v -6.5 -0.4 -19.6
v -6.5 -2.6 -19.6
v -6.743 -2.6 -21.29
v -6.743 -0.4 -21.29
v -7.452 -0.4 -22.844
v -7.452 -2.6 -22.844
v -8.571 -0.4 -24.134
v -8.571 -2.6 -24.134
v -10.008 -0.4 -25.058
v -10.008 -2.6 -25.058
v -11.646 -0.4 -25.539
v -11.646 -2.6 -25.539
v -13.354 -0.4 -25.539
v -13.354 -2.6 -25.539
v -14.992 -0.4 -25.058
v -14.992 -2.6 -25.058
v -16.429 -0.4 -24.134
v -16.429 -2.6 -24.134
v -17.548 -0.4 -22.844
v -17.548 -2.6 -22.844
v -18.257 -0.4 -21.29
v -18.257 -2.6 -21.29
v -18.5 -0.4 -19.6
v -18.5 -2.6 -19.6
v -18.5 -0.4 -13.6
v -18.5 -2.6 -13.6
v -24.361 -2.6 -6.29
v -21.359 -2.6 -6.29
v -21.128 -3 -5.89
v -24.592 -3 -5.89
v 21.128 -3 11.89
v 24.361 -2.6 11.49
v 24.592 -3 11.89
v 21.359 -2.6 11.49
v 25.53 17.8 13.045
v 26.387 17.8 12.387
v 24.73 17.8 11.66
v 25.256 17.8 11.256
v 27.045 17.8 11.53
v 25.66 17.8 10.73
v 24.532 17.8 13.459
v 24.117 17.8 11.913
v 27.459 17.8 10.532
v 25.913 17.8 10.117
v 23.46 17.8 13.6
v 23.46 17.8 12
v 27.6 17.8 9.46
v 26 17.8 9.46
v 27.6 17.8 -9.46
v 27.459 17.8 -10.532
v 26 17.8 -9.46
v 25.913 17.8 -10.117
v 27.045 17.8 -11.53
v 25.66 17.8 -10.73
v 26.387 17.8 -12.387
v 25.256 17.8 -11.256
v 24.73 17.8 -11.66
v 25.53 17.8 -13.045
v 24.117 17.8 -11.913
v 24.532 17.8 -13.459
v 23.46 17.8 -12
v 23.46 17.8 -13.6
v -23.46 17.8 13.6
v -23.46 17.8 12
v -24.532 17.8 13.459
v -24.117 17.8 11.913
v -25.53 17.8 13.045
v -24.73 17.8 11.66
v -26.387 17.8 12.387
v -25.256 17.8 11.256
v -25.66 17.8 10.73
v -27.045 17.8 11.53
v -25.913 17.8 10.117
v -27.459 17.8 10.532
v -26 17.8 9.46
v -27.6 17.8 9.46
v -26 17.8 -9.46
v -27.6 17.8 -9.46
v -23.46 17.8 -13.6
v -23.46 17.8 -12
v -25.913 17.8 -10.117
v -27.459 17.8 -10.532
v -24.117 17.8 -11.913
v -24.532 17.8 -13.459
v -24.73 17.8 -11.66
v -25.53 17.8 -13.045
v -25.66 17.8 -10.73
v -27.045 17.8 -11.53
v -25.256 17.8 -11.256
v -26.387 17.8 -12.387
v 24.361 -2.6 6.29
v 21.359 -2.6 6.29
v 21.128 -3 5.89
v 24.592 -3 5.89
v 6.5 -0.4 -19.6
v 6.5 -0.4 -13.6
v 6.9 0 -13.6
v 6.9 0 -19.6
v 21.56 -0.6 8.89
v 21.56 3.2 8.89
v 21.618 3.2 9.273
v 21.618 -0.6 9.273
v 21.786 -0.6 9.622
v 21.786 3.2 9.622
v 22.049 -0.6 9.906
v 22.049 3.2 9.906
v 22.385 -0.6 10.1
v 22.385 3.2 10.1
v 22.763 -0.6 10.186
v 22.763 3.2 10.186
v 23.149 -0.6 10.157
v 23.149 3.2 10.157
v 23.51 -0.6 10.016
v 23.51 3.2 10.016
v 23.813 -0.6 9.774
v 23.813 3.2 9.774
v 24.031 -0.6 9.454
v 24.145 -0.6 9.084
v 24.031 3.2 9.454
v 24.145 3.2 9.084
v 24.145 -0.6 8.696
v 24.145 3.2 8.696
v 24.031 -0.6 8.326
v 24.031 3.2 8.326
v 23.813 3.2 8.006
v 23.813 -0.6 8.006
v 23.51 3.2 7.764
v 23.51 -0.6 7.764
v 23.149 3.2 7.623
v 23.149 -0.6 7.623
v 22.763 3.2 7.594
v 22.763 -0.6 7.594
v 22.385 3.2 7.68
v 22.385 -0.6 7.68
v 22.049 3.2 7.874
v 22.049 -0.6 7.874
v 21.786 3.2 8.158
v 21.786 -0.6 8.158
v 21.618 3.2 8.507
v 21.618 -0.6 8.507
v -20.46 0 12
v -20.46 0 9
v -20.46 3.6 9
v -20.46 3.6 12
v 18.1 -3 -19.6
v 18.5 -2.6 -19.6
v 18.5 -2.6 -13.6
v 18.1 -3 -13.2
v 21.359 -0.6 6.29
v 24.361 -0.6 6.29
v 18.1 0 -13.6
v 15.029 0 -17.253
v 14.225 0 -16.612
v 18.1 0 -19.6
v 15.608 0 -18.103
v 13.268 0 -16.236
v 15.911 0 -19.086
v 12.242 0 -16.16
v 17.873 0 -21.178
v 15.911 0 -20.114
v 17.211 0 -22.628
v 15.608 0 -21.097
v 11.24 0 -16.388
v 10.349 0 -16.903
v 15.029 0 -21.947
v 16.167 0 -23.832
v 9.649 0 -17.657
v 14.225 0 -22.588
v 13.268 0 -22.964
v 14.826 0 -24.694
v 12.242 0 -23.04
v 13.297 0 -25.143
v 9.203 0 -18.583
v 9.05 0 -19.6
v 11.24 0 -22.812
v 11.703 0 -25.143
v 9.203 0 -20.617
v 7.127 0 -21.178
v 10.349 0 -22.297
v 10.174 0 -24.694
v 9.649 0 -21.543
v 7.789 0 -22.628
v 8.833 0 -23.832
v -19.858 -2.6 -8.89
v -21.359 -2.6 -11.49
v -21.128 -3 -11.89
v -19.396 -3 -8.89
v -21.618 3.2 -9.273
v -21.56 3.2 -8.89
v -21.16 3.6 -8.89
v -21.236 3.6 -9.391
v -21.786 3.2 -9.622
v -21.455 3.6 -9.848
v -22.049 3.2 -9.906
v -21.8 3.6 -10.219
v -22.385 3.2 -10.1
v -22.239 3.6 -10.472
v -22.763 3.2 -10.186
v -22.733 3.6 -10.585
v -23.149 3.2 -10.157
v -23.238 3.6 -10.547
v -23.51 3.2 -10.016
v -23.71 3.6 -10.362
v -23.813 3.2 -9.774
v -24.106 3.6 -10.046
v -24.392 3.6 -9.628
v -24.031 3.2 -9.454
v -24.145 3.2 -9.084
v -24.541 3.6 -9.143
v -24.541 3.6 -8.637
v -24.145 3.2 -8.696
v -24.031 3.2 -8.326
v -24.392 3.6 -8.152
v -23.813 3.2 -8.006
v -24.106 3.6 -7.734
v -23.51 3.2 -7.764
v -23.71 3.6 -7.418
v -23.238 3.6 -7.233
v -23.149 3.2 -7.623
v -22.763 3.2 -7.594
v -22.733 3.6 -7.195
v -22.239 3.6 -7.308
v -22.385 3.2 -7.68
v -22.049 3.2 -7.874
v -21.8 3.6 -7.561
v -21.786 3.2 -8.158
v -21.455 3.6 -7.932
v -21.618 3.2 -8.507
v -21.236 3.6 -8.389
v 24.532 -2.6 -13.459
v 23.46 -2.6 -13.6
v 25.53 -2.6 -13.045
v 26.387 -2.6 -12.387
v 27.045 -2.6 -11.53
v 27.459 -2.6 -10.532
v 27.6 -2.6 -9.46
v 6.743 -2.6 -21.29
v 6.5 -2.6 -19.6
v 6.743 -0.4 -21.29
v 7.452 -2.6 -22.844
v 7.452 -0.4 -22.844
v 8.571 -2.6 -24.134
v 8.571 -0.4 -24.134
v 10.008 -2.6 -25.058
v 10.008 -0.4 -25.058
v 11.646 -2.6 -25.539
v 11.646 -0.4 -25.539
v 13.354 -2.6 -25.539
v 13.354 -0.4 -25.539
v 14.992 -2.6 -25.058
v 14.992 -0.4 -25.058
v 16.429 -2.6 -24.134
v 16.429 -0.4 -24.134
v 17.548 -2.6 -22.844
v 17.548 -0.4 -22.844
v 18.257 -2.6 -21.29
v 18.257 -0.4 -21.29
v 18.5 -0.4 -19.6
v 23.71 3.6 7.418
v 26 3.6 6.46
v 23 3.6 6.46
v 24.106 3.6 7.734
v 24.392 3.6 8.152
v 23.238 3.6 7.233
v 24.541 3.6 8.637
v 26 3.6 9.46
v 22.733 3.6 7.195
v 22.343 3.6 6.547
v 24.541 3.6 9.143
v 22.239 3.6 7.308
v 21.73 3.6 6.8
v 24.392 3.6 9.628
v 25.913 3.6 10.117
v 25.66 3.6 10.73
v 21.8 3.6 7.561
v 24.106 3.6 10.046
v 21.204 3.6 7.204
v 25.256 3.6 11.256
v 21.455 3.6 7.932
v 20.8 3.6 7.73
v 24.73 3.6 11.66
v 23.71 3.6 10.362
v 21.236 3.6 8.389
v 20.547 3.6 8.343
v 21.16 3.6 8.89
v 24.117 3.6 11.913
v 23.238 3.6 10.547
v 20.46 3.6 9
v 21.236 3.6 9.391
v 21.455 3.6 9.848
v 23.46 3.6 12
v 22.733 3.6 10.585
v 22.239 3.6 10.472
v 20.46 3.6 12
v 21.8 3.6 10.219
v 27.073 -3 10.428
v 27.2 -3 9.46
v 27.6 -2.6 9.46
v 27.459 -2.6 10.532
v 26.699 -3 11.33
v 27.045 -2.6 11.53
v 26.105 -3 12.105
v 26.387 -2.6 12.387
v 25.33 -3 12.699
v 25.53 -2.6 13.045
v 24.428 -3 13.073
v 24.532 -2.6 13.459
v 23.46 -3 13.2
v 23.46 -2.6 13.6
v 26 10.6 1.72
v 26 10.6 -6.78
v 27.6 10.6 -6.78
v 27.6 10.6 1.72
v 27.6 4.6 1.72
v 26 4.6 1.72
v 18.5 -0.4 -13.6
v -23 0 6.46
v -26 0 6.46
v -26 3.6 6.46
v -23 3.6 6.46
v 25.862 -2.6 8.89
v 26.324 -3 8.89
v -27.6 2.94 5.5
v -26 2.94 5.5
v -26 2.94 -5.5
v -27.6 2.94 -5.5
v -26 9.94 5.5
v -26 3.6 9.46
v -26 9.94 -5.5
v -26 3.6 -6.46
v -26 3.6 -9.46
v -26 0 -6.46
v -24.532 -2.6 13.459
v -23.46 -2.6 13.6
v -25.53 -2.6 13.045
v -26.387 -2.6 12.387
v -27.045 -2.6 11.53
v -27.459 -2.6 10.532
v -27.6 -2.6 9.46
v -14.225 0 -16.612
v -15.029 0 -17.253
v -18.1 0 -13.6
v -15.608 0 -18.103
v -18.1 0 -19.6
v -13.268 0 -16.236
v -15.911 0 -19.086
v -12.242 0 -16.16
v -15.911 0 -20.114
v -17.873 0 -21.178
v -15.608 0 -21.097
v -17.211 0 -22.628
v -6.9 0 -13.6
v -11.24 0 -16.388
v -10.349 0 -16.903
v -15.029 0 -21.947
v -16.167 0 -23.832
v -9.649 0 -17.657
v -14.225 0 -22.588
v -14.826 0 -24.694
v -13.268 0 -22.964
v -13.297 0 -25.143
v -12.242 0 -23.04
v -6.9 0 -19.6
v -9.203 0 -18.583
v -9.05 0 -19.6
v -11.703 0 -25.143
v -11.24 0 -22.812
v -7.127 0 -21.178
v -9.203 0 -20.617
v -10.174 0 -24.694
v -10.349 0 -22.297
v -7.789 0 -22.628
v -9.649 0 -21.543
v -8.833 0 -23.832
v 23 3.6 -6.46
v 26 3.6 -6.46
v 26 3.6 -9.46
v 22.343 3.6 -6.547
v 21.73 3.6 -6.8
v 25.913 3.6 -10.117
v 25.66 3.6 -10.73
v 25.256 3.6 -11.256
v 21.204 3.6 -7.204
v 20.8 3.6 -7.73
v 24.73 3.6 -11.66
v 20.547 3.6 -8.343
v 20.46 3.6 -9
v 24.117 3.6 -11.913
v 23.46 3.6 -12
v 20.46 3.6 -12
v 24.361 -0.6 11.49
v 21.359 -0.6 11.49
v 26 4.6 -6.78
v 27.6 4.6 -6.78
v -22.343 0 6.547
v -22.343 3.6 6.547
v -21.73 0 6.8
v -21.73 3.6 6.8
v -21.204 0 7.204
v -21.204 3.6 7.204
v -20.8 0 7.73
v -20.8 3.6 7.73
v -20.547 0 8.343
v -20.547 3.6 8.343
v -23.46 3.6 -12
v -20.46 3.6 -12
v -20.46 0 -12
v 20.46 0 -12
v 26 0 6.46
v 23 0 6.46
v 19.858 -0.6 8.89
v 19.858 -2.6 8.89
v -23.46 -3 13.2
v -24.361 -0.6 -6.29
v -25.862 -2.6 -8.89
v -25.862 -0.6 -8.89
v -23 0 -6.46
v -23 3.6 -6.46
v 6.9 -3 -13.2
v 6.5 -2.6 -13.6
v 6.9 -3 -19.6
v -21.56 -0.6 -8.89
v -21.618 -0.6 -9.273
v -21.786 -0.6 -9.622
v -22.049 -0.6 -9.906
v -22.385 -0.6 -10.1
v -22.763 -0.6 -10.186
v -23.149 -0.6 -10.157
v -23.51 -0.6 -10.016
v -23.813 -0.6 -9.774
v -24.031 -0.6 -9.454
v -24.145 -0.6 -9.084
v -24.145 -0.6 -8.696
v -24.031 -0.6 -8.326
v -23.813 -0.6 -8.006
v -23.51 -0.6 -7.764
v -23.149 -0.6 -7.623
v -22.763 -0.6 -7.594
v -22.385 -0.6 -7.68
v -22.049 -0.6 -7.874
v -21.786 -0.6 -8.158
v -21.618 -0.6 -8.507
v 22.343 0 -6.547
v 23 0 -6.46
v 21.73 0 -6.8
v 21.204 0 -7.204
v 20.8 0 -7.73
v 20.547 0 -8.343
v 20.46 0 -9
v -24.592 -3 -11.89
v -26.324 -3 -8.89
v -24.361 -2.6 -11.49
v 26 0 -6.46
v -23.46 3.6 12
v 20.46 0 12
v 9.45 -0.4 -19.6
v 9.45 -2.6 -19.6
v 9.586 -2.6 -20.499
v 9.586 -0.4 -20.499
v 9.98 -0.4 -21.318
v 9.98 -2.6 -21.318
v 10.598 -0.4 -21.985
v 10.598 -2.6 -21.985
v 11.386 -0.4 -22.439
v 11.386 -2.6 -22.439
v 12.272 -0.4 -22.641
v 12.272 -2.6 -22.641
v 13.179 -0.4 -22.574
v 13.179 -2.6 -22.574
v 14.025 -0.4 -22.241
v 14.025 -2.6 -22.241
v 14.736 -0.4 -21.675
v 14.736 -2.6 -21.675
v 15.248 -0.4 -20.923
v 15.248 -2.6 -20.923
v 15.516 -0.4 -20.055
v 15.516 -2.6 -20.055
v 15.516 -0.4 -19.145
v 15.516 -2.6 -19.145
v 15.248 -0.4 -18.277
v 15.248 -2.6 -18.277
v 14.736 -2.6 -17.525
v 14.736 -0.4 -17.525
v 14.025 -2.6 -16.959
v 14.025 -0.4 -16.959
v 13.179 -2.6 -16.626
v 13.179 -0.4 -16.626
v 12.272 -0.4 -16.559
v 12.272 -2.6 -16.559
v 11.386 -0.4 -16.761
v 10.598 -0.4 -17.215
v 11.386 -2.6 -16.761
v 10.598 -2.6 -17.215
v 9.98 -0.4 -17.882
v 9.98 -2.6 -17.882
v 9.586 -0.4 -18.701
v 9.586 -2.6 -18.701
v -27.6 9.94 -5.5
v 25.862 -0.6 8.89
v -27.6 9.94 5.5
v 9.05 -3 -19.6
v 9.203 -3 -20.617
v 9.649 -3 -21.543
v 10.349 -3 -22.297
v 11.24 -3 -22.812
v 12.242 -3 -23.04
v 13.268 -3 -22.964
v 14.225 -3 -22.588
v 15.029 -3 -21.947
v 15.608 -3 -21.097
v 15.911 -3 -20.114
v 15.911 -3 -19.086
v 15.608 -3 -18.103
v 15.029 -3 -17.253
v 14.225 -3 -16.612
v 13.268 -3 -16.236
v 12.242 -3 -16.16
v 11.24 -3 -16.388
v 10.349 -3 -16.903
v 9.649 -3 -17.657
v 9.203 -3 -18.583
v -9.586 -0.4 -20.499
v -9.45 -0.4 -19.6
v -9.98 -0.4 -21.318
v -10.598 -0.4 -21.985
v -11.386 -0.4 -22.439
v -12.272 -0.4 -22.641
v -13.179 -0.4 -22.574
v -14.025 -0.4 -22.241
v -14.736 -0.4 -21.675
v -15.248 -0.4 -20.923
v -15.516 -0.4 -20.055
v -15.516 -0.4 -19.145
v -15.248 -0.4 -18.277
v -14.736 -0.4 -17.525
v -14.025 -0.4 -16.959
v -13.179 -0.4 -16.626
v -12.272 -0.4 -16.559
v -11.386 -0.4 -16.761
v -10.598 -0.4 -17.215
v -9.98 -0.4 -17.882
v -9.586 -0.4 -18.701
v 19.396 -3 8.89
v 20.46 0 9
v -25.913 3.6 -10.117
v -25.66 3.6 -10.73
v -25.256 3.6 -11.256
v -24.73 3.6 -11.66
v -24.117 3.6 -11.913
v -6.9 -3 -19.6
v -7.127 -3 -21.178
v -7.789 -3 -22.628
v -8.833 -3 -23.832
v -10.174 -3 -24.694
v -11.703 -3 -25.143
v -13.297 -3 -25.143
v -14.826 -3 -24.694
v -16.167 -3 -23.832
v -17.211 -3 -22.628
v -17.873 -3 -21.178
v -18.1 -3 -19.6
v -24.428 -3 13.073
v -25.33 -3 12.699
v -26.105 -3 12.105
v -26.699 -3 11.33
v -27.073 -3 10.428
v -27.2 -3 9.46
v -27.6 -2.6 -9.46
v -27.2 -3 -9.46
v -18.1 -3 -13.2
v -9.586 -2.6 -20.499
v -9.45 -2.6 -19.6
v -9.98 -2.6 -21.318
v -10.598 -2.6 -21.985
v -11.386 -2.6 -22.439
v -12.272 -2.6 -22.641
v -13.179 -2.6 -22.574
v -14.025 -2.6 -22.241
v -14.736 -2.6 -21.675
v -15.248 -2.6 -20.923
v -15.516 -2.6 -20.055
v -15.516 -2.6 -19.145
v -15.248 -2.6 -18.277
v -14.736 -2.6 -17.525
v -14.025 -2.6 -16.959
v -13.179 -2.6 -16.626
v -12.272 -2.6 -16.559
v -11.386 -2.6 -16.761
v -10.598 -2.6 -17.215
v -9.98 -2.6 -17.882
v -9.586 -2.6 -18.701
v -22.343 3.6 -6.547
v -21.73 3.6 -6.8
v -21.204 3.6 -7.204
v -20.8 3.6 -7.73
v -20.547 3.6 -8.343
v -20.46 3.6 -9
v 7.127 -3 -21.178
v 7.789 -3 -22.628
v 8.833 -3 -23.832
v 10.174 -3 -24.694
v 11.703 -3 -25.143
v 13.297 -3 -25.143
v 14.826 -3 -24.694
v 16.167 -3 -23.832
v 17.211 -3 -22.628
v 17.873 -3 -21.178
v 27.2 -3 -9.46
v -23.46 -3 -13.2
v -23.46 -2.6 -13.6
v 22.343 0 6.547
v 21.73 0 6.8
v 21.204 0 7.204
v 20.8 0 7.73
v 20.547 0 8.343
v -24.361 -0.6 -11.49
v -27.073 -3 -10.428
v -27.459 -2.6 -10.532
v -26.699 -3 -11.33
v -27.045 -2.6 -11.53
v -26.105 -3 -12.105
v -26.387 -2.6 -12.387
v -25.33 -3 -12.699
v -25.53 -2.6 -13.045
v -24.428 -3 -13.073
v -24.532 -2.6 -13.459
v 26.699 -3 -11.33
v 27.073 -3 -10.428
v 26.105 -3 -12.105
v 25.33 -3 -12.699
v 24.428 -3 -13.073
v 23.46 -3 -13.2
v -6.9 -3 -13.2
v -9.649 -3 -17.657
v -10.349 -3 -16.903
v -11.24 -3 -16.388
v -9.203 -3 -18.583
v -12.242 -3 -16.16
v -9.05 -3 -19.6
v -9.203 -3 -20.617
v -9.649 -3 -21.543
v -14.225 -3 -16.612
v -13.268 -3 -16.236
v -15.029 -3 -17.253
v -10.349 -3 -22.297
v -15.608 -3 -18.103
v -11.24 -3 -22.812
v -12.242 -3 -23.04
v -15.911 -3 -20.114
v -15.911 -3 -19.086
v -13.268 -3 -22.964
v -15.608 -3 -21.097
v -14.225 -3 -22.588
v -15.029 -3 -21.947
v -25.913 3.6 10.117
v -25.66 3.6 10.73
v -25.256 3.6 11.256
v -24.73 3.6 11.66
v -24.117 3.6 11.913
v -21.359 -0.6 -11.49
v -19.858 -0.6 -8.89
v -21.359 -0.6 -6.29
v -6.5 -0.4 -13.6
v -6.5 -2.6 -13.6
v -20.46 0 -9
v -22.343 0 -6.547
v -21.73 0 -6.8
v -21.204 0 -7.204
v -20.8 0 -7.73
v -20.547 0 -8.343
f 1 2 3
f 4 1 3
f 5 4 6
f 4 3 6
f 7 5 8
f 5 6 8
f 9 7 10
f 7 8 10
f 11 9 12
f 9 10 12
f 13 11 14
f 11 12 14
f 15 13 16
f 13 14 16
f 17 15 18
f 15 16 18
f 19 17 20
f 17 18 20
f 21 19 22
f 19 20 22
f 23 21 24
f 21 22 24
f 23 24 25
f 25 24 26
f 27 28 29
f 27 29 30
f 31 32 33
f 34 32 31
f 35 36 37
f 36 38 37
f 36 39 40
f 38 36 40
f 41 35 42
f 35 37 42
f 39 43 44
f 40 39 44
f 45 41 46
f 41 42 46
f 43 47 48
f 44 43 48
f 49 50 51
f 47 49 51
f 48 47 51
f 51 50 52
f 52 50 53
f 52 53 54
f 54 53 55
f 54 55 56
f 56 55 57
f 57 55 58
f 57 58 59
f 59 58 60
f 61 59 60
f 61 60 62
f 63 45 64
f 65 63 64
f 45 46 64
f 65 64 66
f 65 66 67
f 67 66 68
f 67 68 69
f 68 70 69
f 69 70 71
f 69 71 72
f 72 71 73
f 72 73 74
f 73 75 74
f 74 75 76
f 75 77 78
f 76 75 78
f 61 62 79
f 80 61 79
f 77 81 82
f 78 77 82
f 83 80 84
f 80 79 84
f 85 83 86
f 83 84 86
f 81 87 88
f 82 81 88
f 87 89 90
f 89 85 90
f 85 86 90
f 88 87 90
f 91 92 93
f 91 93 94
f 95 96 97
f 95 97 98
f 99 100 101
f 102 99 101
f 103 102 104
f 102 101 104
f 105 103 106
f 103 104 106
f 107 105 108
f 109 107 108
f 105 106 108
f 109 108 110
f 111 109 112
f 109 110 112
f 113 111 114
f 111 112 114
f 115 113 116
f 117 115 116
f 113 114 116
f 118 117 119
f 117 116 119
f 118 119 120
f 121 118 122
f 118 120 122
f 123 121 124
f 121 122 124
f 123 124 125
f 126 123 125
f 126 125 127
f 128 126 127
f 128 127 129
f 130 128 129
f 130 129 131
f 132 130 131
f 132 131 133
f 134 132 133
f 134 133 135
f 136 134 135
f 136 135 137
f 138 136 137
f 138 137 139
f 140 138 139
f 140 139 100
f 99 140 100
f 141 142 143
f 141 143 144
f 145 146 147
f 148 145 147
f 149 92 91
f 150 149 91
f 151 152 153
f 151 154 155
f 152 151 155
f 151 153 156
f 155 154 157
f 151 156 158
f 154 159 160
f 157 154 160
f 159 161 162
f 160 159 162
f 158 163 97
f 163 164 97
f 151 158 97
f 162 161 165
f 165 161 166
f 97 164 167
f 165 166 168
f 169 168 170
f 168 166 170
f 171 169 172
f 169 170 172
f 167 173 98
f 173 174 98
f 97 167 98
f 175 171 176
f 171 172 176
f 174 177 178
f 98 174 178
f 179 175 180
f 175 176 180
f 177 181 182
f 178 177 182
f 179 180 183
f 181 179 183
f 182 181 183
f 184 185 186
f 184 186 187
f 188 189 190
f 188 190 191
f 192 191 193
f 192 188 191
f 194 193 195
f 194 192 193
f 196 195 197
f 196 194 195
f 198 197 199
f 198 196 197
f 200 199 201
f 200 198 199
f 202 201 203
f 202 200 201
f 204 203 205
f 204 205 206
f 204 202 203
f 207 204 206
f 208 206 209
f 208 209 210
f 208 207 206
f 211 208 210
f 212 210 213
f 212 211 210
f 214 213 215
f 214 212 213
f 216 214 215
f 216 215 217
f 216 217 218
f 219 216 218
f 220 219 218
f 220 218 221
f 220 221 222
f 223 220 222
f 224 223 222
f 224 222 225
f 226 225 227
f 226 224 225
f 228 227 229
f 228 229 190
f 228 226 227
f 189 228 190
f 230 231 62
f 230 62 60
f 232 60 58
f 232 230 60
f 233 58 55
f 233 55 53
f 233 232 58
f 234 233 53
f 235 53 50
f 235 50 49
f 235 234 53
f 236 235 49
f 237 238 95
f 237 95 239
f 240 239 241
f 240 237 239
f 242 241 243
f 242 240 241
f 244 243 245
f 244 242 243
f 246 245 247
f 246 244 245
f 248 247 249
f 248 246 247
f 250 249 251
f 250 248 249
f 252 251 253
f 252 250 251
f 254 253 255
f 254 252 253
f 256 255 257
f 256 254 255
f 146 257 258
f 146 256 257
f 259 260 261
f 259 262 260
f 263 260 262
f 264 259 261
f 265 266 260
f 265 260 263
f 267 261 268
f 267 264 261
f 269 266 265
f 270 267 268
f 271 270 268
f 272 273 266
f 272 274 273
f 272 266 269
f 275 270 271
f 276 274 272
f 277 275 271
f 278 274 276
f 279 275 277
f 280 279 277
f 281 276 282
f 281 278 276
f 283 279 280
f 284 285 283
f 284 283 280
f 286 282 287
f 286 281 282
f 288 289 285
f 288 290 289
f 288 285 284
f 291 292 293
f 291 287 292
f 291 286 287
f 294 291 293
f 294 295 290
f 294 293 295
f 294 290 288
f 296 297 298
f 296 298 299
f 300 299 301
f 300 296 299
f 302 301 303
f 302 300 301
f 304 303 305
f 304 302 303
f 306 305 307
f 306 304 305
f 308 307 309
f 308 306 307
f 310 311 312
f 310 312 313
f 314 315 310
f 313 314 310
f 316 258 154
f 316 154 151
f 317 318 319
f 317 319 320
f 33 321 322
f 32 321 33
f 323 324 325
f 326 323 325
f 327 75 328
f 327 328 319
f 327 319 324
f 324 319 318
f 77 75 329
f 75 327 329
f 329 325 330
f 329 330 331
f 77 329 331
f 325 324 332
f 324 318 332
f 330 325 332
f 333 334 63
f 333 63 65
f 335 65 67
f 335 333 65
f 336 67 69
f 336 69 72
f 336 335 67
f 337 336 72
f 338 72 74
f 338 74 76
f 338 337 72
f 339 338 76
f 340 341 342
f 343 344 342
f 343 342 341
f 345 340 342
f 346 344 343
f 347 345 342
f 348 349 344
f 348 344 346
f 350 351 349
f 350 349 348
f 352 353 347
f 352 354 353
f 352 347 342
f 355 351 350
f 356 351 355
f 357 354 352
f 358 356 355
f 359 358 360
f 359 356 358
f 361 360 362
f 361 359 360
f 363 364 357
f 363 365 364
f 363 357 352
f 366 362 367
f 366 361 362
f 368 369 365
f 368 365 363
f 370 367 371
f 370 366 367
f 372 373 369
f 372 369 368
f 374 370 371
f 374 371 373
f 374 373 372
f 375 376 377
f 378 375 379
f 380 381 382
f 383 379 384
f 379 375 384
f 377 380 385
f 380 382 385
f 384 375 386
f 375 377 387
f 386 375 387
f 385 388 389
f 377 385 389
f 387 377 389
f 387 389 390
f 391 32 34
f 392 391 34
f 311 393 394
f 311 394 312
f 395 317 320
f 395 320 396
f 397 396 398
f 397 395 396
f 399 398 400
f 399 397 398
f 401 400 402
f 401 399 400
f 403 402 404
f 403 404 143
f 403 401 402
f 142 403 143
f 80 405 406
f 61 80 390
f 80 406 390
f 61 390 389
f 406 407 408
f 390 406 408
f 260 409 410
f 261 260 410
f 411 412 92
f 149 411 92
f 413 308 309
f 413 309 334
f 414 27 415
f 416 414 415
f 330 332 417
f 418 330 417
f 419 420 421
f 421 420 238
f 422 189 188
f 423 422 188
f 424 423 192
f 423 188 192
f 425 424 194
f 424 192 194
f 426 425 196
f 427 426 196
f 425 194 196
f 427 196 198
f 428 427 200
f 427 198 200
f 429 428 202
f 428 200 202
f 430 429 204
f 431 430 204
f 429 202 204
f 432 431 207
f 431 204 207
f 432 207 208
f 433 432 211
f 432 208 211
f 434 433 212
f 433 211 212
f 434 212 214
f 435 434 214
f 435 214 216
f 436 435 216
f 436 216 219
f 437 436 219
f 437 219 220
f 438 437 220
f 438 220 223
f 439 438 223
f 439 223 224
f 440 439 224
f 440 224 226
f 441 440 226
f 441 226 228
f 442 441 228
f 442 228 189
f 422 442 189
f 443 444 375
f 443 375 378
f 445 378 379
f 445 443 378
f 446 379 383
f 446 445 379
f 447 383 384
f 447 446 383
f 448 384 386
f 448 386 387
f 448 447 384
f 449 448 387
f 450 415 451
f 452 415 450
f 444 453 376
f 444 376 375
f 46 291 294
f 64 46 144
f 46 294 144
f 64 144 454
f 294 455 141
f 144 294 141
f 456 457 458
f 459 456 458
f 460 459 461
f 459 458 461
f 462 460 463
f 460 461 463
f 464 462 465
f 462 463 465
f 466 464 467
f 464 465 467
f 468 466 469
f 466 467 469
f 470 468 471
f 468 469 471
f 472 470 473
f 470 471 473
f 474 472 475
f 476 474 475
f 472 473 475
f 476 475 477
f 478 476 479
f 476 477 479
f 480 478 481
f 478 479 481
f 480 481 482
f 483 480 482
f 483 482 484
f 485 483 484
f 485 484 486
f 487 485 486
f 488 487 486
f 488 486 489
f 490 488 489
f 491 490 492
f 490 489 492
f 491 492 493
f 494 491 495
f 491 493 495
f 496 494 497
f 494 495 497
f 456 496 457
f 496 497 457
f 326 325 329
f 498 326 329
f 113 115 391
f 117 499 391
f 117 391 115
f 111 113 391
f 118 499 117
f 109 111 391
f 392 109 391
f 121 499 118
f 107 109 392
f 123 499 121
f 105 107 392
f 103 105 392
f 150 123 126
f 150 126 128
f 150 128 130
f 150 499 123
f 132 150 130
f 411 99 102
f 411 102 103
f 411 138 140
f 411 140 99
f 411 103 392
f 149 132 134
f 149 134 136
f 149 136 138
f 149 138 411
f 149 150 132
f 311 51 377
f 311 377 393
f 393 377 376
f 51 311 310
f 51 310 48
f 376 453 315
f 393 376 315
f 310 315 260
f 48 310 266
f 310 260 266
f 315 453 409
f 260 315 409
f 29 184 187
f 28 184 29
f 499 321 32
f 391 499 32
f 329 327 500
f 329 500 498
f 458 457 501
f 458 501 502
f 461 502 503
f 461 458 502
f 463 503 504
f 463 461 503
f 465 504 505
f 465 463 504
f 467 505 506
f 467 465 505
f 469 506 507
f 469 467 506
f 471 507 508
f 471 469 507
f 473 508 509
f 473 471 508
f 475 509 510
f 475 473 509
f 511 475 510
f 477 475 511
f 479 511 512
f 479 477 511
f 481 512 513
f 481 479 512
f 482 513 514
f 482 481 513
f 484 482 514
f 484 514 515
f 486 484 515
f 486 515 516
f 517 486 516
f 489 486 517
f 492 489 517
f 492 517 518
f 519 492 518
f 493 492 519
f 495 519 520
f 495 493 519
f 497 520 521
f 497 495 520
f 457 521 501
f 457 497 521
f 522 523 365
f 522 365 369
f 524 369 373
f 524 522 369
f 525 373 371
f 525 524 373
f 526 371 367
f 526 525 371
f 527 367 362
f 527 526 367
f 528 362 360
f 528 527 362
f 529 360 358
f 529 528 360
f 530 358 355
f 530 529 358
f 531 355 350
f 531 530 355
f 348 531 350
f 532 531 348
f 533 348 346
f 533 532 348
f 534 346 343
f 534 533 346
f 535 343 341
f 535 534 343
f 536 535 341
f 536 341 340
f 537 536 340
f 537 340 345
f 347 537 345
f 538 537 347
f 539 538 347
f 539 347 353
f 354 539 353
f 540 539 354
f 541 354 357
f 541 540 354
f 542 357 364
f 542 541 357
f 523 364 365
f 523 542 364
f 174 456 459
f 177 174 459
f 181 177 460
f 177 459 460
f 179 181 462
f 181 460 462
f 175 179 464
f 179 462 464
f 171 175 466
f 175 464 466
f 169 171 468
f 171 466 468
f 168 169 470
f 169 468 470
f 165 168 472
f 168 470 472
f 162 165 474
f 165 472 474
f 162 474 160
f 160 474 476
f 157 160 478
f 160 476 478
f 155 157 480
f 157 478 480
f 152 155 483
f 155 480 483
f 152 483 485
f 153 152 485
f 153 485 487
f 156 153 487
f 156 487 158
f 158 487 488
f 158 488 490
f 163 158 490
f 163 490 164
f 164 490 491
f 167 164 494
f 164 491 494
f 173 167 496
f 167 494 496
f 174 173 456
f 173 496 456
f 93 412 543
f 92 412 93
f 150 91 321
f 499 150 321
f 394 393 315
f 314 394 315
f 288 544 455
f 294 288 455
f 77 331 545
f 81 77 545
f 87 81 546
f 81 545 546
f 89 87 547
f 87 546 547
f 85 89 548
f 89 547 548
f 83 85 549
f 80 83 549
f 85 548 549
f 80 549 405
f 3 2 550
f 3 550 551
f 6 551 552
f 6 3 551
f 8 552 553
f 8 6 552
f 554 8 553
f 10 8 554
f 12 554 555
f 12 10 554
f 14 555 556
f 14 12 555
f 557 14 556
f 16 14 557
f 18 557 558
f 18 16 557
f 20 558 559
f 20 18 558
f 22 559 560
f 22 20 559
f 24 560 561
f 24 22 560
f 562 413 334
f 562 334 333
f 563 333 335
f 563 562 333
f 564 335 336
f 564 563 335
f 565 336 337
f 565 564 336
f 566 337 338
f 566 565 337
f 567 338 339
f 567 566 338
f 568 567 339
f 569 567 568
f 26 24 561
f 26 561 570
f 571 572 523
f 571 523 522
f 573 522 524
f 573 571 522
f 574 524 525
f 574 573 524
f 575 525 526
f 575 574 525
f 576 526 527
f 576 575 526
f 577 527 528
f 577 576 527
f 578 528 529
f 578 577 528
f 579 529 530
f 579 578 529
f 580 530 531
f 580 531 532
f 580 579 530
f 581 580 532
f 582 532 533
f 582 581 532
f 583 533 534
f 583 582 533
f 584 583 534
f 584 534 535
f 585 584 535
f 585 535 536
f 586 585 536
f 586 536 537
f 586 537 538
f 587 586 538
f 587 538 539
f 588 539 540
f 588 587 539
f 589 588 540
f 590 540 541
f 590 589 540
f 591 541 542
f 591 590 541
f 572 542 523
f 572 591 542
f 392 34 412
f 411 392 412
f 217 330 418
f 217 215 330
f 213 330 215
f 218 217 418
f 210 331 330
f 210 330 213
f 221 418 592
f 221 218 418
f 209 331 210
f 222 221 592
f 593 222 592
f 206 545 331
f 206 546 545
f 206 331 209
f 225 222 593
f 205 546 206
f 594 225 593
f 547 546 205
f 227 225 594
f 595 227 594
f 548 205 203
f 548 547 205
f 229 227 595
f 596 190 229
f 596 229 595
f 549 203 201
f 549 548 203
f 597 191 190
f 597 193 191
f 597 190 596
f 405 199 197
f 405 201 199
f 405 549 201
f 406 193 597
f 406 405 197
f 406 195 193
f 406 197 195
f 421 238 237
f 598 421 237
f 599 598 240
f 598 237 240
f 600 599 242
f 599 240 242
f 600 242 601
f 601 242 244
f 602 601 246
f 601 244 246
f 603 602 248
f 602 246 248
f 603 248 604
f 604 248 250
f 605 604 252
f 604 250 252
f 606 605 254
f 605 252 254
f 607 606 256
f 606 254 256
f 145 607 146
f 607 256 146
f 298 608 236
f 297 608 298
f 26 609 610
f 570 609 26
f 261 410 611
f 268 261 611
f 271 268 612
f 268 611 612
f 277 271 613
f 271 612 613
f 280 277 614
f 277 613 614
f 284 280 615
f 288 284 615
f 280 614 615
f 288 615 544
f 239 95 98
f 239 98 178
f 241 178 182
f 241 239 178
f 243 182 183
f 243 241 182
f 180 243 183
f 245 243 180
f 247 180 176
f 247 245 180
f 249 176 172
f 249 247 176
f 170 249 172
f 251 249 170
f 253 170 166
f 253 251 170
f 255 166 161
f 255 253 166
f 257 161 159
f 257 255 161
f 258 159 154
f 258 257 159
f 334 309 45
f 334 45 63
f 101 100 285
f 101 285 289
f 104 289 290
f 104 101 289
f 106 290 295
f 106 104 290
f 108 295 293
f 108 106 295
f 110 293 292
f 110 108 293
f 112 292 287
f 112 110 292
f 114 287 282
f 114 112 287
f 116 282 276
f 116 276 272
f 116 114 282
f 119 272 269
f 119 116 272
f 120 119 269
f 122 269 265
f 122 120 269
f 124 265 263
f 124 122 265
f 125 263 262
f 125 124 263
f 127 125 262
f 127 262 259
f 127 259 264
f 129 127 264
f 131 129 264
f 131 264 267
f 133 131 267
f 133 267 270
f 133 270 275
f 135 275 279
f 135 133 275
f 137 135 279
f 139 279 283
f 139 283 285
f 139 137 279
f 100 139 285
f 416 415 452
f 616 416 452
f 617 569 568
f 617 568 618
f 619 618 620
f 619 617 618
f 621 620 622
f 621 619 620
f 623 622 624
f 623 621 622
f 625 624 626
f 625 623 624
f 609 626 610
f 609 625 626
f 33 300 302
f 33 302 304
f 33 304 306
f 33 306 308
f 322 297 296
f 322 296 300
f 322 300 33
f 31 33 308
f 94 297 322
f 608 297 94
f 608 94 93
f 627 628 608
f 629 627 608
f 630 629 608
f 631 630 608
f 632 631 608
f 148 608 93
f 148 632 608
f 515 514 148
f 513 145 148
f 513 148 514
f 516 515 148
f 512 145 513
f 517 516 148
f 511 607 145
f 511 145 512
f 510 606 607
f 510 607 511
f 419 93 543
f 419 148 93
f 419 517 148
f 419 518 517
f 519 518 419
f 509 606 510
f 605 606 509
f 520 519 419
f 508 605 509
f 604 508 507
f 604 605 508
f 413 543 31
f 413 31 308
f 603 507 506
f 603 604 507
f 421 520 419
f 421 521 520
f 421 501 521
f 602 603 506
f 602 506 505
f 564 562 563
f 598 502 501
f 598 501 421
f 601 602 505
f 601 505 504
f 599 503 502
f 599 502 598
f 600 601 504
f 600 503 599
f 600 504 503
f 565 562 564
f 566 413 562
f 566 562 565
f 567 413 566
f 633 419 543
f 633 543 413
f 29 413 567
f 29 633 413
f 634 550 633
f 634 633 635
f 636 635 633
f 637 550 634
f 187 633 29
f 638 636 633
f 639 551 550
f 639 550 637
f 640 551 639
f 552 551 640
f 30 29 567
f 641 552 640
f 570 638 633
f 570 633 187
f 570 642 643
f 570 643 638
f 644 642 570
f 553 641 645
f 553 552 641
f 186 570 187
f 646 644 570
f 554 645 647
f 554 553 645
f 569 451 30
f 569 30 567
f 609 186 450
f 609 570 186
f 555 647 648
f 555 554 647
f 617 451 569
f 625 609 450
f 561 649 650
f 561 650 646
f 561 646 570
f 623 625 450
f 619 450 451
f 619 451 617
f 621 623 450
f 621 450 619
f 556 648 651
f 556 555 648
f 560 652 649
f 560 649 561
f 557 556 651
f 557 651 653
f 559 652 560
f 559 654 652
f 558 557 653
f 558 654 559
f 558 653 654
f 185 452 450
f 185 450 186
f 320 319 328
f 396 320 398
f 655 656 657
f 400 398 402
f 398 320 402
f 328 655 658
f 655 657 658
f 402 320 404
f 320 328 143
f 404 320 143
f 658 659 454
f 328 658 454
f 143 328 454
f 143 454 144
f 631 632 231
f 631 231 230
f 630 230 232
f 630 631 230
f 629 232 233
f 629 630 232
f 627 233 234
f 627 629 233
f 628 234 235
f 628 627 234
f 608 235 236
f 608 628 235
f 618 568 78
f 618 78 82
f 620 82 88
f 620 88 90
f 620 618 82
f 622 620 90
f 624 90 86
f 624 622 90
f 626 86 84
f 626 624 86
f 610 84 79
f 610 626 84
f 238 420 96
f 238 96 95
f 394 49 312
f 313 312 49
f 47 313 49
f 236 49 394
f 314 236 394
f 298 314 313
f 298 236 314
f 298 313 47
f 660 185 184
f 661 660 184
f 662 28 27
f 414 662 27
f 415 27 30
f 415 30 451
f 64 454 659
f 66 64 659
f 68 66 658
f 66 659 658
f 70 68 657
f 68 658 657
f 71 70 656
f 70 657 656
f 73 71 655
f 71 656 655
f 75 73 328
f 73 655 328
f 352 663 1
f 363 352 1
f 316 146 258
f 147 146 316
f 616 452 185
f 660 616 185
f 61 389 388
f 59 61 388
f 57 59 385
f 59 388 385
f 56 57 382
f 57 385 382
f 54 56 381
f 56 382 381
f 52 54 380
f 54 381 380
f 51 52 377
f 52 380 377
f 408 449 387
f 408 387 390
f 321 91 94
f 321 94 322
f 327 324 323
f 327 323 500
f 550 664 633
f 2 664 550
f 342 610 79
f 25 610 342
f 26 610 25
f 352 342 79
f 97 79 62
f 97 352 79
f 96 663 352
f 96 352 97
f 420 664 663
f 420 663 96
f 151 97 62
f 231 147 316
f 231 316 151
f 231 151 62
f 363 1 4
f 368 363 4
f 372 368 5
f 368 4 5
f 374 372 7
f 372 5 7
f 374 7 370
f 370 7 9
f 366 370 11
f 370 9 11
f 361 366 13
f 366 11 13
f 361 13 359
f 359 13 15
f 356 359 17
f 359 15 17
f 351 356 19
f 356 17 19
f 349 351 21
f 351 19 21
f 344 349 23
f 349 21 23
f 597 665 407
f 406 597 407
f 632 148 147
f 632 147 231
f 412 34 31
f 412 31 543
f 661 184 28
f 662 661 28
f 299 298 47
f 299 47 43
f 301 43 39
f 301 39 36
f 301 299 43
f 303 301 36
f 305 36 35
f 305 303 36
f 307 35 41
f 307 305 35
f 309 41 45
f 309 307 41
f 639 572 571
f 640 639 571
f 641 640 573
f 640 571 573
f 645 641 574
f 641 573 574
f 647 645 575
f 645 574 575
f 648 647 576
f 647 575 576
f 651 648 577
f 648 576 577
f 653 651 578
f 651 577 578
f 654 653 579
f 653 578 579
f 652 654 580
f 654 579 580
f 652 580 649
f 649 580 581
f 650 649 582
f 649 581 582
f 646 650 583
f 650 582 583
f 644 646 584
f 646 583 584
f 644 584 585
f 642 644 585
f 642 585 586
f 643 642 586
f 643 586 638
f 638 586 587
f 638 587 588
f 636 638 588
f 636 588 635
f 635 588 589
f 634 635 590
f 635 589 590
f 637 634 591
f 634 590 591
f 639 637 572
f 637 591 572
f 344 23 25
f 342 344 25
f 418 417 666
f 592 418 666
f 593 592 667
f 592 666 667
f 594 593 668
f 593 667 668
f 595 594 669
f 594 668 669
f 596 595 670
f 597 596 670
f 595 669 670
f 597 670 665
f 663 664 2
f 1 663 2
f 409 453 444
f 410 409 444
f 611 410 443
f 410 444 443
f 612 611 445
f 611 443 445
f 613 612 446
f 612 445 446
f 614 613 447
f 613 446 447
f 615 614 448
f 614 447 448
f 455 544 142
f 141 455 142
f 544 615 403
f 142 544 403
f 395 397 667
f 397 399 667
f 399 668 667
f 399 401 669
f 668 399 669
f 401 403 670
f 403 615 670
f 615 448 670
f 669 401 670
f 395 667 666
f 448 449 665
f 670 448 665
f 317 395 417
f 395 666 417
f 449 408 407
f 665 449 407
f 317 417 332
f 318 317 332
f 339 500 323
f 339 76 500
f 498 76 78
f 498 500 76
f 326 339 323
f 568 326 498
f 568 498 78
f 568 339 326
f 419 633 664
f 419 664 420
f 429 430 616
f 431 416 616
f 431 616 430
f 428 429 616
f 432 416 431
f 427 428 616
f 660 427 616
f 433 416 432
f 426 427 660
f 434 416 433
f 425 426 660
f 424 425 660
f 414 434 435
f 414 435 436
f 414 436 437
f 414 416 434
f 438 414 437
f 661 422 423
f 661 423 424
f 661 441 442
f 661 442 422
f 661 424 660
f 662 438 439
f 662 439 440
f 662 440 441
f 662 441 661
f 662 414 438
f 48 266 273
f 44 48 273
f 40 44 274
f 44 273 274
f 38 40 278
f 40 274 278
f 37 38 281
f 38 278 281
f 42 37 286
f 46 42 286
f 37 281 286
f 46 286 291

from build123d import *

# Parameters (mm, degrees)
BASE_DEPTH            = 3
WALLS_START           = 17.8
WALLS_DEPTH           = 17.8
PEDESTAL_DEPTH        = 3.6
SKETCH8_R             = 1.3
THRUHOLE_DEPTH        = 34.887460808
NUT_HOLE_DEPTH        = 2.4
MIRROR2_COPY_1_DEPTH  = 3.6
SKETCH6_R             = 3.05
EYELET_DEPTH          = 3
SKETCH4_W             = 11
SKETCH4_H             = 7
HOLE_USB_PORT_DEPTH   = 63.009354133
SKETCH5_W             = 8.5
SKETCH5_H             = 6
HOLE_SCREW_TERM_DEPTH = 63.009354133
CIRPATTERN1_COUNT     = 2
CHAMFER1_SIZE         = 0.4


with BuildPart() as part:
    # Sketch1 → base (new body)
    with BuildSketch(Plane(origin=(0, 0, 0), x_dir=(1, 0, 0), z_dir=(0, 1, 0))):
        with BuildLine():
            Line((-23.46, 13.6), (23.46, 13.6))
            ThreePointArc((23.46, 13.6), (26.387422074, 12.387422074), (27.6, 9.46))
            Line((27.6, 9.46), (27.6, -9.46))
            ThreePointArc((27.6, -9.46), (26.387422074, -12.387422074), (23.46, -13.6))
            Line((23.46, -13.6), (-23.46, -13.6))
            ThreePointArc((-23.46, -13.6), (-26.387422074, -12.387422074), (-27.6, -9.46))
            Line((-27.6, -9.46), (-27.6, 9.46))
            ThreePointArc((-27.6, 9.46), (-26.387422074, 12.387422074), (-23.46, 13.6))
        make_face()
    extrude(amount=-BASE_DEPTH)

    # Sketch1<3> → walls (add)
    with BuildSketch(Plane(origin=(0, 0, 0), x_dir=(1, 0, 0), z_dir=(0, 1, 0)).offset(WALLS_START)):
        with BuildLine():
            Line((23.46, 13.6), (-23.46, 13.6))
            ThreePointArc((-23.46, 13.6), (-26.387422074, 12.387422074), (-27.6, 9.46))
            Line((-27.6, 9.46), (-27.6, -9.46))
            ThreePointArc((-27.6, -9.46), (-26.387422074, -12.387422074), (-23.46, -13.6))
            Line((-23.46, -13.6), (23.46, -13.6))
            ThreePointArc((23.46, -13.6), (26.387422074, -12.387422074), (27.6, -9.46))
            Line((27.6, -9.46), (27.6, 9.46))
            ThreePointArc((27.6, 9.46), (26.387422074, 12.387422074), (23.46, 13.6))
        make_face()
        with BuildLine():
            Line((23.46, -12), (-23.46, -12))
            ThreePointArc((-23.46, -12), (-25.256051224, -11.256051224), (-26, -9.46))
            Line((-26, -9.46), (-26, 9.46))
            ThreePointArc((-26, 9.46), (-25.256051224, 11.256051224), (-23.46, 12))
            Line((-23.46, 12), (23.46, 12))
            ThreePointArc((23.46, 12), (25.256051224, 11.256051224), (26, 9.46))
            Line((26, 9.46), (26, -9.46))
            ThreePointArc((26, -9.46), (25.256051224, -11.256051224), (23.46, -12))
        make_face(mode=Mode.SUBTRACT)
    extrude(amount=-WALLS_DEPTH)

    # Sketch2 → pedestal (add)
    with BuildSketch(Plane(origin=(0, 0, 0), x_dir=(1, 0, 0), z_dir=(0, 1, 0))):
        with BuildLine():
            Line((-26, 6.46), (-23, 6.46))
            ThreePointArc((-23, 6.46), (-21.203948776, 7.203948776), (-20.46, 9))
            Line((-20.46, 9), (-20.46, 12))
            Line((-20.46, 12), (-26, 12))
            Line((-26, 12), (-26, 6.46))
        make_face()
    pedestal = extrude(amount=PEDESTAL_DEPTH)

    # Sketch8 → thruhole (cut, through all)
    with BuildSketch(Plane(origin=(0, 3.6, 0), x_dir=(1, 0, 0), z_dir=(0, 1, 0))):
        with Locations((-22.86, 8.89)):
            Circle(SKETCH8_R)
    thruhole = extrude(amount=-THRUHOLE_DEPTH, mode=Mode.SUBTRACT)

    # Sketch10 → nut hole (cut)
    with BuildSketch(Plane.XZ.offset(3)):
        Polygon((-25.8622214, -8.89), (-24.3611107, -11.49), (-21.3588893, -11.49), (-19.8577786, -8.89), (-21.3588893, -6.29), (-24.3611107, -6.29), align=None)
    nut_hole = extrude(amount=-NUT_HOLE_DEPTH, mode=Mode.SUBTRACT)

    # Mirror1: pedestal across plane
    add(pedestal.mirror(Plane(origin=(0, 0, 0), x_dir=(0, 0, 1), z_dir=(1, 0, 0))))

    # Mirror2: pedestal across plane
    add(pedestal.mirror(Plane.XY))

    # Mirror2 copy 1 sketch → Mirror2 copy 1 (add)
    with BuildSketch(Plane(origin=(0, 0, 0), x_dir=(-1, 0, 0), z_dir=(0, 1, 0))):
        with BuildLine():
            Line((-26, 6.46), (-23, 6.46))
            ThreePointArc((-23, 6.46), (-21.203948776, 7.203948776), (-20.46, 9))
            Line((-20.46, 9), (-20.46, 12))
            Line((-20.46, 12), (-26, 12))
            Line((-26, 12), (-26, 6.46))
        make_face()
    extrude(amount=MIRROR2_COPY_1_DEPTH)

    # Sketch6 → eyelet (add)
    with BuildSketch(Plane(origin=(0, -3, 0), x_dir=(1, 0, 0), z_dir=(0, 1, 0))):
        with BuildLine():
            Line((-18.5, 19.6), (-18.5, 13.6))
            Line((-18.5, 13.6), (-6.5, 13.6))
            Line((-6.5, 13.6), (-6.5, 19.6))
            ThreePointArc((-6.5, 19.6), (-12.5, 25.6), (-18.5, 19.6))
        make_face()
        with Locations((-12.5, 19.6)):
            Circle(SKETCH6_R, mode=Mode.SUBTRACT)
    eyelet = extrude(amount=EYELET_DEPTH)

    # Mirror3: eyelet across plane
    add(eyelet.mirror(Plane(origin=(0, 0, 0), x_dir=(0, 0, 1), z_dir=(1, 0, 0))))

    # Sketch4 → hole_USB_port (cut, through all)
    with BuildSketch(Plane(origin=(-26, 0, 0), x_dir=(0, 0, -1), z_dir=(1, 0, 0))):
        with Locations((0, 6.44)):
            Rectangle(SKETCH4_W, SKETCH4_H)
    extrude(amount=-HOLE_USB_PORT_DEPTH, mode=Mode.SUBTRACT)

    # Sketch5 → hole_screw_term (cut, through all)
    with BuildSketch(Plane.ZY.offset(-26)):
        with Locations((-2.53, 7.6)):
            Rectangle(SKETCH5_W, SKETCH5_H)
    extrude(amount=-HOLE_SCREW_TERM_DEPTH, mode=Mode.SUBTRACT)

    # CirPattern1: thruhole, nut hole ×2 about axis
    cirpattern1_axis = Axis((0, 18.84, 0), (0, -1, 0))
    add([thruhole.rotate(cirpattern1_axis, i * 360 / CIRPATTERN1_COUNT) for i in range(1, CIRPATTERN1_COUNT)], mode=Mode.SUBTRACT)
    add([nut_hole.rotate(cirpattern1_axis, i * 360 / CIRPATTERN1_COUNT) for i in range(1, CIRPATTERN1_COUNT)], mode=Mode.SUBTRACT)

    # Chamfer1
    chamfer1_edges = [part.edges().sort_by_distance(p)[0] for p in [
        (15.55, -3, -19.6),
        (-15.55, -3, -19.6),
        (-27.6, -3, 0),
        (-26.387422074, -3, 12.387422074),
        (0, -3, 13.6),
        (26.387422074, -3, 12.387422074),
        (27.6, -3, 0),
        (26.387422074, -3, -12.387422074),
        (20.98, -3, -13.6),
        (18.5, -3, -16.6),
        (12.5, -3, -25.6),
        (6.5, -3, -16.6),
        (0, -3, -13.6),
        (-6.5, -3, -16.6),
        (-12.5, -3, -25.6),
        (-18.5, -3, -16.6),
        (-20.98, -3, -13.6),
        (-26.387422074, -3, -12.387422074),
        (-25.11166605, -3, -10.19),
        (-22.86, -3, -11.49),
        (-20.60833395, -3, -10.19),
        (-20.60833395, -3, -7.59),
        (-22.86, -3, -6.29),
        (-25.11166605, -3, -7.59),
        (-24.16, 3.6, -8.89),
        (-18.5, 0, -16.6),
        (-12.5, 0, -25.6),
        (-6.5, 0, -16.6),
        (6.5, 0, -16.6),
        (12.5, 0, -25.6),
        (18.5, 0, -16.6),
        (-15.55, 0, -19.6),
        (15.55, 0, -19.6),
        (25.11166605, -3, 10.19),
        (22.86, -3, 11.49),
        (20.60833395, -3, 10.19),
        (20.60833395, -3, 7.59),
        (22.86, -3, 6.29),
        (25.11166605, -3, 7.59),
        (24.16, 3.6, 8.89),
    ]]
    chamfer(chamfer1_edges, length=CHAMFER1_SIZE)


solid = part.part
